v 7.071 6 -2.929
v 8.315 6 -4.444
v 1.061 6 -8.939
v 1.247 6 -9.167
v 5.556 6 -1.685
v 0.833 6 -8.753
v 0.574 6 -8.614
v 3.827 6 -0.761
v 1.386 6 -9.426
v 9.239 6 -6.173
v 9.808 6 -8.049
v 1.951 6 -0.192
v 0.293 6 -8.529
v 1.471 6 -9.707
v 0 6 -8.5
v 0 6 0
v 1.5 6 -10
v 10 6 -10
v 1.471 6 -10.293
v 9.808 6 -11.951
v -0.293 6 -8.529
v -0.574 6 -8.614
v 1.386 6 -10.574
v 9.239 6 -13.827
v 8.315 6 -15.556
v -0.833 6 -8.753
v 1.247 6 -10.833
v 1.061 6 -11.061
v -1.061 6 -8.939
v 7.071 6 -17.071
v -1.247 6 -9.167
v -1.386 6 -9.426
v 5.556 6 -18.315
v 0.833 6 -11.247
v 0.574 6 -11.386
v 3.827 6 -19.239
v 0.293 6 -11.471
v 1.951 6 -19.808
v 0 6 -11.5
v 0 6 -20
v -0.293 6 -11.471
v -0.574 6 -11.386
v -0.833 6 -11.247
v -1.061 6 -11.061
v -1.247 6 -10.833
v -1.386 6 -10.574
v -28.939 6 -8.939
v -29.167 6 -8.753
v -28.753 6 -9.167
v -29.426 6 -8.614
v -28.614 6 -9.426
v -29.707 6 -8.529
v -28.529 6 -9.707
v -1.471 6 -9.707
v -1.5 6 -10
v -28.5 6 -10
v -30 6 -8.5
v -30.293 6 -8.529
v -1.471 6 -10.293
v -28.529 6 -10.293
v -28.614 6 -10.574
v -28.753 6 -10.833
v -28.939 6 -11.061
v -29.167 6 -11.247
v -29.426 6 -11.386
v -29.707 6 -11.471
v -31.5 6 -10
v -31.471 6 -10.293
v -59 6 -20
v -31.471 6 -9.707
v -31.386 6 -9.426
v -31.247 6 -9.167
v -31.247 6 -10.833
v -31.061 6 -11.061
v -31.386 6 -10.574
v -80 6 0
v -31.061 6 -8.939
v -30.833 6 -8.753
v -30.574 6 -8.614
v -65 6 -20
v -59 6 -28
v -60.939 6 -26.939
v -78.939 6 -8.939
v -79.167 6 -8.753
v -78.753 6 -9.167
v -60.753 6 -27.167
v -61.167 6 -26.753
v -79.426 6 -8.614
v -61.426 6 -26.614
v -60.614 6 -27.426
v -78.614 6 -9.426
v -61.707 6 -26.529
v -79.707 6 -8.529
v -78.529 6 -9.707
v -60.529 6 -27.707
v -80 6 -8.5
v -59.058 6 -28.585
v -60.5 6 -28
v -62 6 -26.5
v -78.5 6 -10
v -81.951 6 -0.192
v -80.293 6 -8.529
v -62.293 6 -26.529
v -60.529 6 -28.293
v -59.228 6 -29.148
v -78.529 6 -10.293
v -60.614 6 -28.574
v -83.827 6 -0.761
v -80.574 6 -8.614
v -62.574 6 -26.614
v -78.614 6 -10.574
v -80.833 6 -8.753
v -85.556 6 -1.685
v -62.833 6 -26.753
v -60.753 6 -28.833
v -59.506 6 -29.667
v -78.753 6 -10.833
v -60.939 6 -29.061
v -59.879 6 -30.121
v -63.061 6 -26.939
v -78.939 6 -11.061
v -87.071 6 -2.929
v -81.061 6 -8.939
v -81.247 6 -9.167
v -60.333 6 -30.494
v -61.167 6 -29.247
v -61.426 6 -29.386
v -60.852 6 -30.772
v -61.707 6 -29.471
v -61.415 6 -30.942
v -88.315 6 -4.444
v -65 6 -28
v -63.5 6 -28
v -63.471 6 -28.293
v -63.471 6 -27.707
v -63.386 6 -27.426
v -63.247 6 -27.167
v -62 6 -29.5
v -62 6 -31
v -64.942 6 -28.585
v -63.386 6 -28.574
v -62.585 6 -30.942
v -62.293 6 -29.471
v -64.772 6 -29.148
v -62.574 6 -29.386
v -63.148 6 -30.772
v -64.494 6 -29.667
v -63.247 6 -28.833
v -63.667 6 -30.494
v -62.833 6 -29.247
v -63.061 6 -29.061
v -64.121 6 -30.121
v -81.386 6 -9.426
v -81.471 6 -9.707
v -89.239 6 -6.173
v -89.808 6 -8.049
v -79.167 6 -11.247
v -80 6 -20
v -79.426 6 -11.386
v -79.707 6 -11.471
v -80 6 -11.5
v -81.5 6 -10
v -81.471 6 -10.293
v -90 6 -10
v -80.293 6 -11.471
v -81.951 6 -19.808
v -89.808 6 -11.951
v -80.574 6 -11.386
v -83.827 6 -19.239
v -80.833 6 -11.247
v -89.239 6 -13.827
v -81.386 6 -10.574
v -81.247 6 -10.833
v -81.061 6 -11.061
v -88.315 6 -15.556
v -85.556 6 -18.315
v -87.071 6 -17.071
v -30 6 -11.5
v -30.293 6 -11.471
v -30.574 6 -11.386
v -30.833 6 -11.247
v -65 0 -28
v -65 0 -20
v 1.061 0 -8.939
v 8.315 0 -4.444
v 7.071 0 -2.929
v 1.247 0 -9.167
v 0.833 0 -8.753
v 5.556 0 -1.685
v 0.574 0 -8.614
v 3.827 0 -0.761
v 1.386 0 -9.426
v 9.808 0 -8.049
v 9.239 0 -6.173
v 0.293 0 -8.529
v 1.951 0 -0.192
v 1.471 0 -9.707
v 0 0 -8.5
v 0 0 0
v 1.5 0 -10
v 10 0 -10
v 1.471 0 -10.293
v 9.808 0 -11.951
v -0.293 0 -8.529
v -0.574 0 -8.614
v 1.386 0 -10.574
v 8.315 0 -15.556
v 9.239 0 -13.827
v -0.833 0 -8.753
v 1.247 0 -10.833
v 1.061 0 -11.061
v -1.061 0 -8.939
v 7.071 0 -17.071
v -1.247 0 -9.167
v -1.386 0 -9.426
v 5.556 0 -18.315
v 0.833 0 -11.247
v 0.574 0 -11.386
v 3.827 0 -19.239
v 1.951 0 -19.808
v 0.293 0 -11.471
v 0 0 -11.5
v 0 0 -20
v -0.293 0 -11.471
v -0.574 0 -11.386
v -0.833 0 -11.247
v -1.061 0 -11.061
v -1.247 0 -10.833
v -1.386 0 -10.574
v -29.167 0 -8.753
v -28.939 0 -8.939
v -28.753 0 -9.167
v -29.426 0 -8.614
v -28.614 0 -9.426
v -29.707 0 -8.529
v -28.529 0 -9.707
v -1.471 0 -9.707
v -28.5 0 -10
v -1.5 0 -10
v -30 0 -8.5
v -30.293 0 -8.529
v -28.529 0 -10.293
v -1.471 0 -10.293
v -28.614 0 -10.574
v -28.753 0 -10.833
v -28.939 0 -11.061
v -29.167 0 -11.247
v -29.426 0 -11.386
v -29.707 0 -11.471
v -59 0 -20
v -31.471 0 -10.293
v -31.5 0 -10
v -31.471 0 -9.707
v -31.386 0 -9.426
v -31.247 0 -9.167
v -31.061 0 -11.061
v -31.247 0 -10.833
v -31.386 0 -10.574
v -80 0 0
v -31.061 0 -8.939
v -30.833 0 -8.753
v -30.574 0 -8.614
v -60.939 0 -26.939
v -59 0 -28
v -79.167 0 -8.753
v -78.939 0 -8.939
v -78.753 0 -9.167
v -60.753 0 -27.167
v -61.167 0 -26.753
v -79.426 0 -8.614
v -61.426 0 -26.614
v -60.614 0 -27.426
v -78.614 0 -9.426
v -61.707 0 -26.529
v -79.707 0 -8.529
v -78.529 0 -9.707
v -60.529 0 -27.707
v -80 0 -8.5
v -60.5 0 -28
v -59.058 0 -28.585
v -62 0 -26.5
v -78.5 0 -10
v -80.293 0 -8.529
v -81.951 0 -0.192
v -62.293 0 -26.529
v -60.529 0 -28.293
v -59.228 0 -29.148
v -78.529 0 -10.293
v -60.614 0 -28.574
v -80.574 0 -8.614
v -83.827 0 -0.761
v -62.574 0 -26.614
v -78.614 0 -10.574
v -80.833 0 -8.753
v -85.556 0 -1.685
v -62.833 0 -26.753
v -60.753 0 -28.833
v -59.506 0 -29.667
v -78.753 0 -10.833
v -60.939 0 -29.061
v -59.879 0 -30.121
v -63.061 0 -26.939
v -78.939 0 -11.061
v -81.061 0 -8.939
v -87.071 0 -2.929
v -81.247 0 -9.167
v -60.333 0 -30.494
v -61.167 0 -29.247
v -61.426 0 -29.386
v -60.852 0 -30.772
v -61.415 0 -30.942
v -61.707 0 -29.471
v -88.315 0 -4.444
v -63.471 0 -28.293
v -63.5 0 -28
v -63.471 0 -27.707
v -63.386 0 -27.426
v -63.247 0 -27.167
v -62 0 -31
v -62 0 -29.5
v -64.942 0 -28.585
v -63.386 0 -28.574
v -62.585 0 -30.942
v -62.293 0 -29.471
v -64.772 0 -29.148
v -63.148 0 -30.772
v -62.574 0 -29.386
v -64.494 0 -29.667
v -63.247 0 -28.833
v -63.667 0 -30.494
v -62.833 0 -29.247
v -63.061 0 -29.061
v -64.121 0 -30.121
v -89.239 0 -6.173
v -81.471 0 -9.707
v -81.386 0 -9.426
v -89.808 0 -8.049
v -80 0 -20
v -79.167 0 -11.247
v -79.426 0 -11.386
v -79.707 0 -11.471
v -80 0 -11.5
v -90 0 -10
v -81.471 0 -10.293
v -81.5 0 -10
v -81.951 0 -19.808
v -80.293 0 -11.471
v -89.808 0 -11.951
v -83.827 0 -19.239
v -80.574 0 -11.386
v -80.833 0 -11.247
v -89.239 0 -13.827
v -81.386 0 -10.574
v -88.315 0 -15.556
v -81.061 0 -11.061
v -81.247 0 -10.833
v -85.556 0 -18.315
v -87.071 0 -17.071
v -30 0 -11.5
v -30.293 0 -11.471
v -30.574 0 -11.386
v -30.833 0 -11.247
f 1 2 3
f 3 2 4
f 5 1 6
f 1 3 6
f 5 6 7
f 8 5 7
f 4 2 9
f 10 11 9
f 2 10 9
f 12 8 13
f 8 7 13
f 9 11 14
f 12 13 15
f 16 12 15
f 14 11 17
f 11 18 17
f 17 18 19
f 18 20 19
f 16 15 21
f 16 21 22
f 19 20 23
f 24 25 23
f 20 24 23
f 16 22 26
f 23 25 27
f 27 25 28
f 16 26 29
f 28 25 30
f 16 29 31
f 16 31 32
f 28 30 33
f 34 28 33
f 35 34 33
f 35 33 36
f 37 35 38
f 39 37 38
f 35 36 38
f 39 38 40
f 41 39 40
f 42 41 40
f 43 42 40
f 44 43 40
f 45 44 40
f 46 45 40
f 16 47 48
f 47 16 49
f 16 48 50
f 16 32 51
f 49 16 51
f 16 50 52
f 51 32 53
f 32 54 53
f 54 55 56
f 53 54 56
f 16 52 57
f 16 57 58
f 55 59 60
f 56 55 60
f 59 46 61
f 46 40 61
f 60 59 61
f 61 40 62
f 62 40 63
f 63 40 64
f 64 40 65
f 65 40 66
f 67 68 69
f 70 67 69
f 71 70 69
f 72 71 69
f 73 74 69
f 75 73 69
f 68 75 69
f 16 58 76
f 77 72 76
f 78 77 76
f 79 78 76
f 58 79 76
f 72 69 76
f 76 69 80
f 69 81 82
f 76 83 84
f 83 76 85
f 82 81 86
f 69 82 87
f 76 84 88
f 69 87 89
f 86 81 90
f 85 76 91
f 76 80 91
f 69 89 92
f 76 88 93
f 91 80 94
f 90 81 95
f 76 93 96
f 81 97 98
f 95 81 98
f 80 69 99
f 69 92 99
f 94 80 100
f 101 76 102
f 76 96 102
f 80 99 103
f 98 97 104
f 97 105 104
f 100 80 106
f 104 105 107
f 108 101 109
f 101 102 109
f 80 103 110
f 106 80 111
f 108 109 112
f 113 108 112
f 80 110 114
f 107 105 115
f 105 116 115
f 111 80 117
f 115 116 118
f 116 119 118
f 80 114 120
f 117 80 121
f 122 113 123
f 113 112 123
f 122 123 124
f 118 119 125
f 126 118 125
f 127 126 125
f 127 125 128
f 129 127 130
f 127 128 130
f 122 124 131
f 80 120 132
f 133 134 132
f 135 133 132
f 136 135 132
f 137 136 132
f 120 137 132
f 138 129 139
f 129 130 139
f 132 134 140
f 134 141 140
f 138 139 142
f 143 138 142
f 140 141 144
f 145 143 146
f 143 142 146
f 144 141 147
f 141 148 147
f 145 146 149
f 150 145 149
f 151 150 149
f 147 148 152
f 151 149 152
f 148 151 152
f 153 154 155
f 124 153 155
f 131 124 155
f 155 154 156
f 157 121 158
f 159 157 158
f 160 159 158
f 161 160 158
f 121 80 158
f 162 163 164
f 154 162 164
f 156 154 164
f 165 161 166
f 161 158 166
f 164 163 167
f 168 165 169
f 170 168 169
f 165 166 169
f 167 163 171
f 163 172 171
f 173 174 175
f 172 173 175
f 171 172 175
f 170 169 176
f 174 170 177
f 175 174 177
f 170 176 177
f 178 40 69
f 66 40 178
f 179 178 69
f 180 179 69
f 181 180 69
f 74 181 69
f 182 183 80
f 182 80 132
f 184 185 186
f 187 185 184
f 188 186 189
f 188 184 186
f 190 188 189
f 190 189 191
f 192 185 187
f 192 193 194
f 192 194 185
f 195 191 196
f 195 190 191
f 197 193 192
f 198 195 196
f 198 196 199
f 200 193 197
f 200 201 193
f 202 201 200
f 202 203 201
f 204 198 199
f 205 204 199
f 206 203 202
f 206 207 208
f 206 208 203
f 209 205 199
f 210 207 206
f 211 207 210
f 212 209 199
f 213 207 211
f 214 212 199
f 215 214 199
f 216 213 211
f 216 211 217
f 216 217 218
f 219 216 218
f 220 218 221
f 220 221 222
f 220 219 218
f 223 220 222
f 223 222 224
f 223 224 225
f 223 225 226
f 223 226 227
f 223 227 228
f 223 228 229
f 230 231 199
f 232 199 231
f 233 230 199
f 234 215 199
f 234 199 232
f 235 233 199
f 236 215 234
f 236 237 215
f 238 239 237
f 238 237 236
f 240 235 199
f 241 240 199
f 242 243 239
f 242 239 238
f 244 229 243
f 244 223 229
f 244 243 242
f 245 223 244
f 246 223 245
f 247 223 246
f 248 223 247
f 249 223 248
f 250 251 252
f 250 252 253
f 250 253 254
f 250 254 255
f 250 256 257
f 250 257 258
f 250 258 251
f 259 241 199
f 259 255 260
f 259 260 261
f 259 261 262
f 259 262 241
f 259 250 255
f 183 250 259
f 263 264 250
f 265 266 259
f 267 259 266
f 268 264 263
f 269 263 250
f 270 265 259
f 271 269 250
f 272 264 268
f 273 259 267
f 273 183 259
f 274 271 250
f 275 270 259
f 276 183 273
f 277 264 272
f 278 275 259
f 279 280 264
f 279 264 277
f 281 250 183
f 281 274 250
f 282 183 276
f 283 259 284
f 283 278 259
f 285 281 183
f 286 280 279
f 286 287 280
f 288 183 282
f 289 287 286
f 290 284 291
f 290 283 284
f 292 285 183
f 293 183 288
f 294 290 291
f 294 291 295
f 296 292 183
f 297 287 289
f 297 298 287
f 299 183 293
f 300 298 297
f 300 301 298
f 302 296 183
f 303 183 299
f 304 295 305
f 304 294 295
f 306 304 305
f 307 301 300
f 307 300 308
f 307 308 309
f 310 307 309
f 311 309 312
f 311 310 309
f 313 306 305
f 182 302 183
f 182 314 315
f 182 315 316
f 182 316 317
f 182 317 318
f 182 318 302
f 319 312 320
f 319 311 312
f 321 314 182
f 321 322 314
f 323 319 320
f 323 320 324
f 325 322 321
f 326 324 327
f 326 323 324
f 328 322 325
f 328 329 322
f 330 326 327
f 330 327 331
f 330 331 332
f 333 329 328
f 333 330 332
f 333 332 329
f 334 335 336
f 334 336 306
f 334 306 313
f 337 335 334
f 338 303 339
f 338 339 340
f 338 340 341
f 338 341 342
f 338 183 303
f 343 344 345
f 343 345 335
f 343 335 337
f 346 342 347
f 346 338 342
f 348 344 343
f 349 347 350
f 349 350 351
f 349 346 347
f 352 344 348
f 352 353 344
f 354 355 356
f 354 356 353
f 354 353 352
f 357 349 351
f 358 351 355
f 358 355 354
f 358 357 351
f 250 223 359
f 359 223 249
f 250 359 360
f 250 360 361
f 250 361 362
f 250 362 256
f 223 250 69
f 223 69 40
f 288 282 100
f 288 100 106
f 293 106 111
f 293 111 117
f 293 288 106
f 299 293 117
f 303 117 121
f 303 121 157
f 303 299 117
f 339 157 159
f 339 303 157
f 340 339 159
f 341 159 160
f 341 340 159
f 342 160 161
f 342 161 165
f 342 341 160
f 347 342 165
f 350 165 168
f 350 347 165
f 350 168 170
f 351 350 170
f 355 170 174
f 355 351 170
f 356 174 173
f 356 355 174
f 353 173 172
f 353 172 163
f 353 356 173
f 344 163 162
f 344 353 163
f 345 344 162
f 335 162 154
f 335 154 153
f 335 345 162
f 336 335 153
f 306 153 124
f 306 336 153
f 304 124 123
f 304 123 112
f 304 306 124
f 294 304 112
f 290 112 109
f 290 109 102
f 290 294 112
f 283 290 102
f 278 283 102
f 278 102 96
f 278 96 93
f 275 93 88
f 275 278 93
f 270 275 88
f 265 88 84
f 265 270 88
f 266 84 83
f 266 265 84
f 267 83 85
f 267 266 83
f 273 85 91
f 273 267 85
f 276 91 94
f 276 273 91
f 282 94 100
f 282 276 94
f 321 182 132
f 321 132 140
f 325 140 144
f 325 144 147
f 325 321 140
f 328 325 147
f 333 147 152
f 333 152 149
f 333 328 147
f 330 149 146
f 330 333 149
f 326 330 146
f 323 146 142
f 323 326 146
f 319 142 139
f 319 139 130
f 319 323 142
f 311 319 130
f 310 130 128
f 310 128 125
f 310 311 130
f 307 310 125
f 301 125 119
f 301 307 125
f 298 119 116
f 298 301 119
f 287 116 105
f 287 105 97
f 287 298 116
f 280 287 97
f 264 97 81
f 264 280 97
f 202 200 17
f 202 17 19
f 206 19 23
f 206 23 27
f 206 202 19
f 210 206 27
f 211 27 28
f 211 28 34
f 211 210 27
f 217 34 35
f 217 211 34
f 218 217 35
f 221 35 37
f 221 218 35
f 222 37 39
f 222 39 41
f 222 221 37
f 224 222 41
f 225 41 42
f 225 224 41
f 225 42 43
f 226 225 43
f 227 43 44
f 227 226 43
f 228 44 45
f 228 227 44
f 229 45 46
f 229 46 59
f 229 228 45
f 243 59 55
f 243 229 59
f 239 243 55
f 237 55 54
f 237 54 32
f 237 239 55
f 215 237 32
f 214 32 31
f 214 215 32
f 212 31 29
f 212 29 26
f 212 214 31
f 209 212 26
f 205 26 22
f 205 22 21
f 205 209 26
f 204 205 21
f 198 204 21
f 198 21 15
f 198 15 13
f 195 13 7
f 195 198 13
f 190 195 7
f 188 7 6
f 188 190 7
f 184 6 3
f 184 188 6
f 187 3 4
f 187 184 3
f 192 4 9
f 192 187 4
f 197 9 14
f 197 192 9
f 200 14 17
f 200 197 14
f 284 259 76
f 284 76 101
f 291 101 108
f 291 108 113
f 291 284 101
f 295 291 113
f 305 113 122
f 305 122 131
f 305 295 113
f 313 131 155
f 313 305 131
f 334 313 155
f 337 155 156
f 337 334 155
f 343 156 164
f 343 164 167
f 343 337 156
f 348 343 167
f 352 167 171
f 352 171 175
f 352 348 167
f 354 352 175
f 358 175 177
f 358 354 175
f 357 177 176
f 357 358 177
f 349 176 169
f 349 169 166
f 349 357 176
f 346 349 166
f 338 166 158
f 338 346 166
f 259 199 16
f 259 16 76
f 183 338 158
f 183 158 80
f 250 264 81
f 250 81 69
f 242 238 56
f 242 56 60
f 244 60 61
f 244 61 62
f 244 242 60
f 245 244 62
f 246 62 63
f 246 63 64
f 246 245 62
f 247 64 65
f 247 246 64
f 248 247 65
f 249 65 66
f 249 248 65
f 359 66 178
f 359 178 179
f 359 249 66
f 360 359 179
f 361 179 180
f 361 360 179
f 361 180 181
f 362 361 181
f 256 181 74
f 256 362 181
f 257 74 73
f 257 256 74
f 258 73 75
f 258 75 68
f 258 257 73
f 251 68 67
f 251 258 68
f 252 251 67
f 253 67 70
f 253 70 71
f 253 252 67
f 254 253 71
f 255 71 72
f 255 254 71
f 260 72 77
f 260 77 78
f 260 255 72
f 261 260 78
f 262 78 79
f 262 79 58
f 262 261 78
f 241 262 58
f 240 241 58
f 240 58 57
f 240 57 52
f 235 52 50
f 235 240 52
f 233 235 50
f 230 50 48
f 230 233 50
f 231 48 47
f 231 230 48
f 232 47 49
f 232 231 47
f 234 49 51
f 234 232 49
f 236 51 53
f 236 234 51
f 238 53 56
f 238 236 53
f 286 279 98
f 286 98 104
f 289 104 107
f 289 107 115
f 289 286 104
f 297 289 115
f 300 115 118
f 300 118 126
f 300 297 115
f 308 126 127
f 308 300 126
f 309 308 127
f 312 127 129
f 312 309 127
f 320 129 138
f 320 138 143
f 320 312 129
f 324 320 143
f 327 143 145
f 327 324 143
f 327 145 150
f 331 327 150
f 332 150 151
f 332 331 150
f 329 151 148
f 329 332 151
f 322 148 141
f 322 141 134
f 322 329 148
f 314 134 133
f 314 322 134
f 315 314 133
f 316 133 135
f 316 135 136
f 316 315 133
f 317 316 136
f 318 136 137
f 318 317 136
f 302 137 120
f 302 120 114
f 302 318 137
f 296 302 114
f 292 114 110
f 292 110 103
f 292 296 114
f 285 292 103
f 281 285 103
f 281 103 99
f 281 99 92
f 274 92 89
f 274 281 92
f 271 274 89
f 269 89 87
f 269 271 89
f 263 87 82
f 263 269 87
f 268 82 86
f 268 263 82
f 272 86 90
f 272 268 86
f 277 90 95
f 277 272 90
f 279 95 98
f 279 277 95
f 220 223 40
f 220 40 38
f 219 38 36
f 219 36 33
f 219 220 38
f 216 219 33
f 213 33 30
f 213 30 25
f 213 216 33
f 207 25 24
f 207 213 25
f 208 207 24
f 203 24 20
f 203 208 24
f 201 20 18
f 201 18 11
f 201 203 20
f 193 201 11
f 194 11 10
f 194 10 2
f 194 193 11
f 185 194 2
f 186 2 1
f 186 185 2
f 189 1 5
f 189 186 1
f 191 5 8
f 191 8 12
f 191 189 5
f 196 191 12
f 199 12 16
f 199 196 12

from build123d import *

# Parameters (mm, degrees)
SKETCH1_R           = 1.5
BOSS_EXTRUDE1_DEPTH = 6


with BuildPart() as part:
    # Sketch1 → Boss-Extrude1 (new body)
    with BuildSketch(Plane(origin=(0, 0, 0), x_dir=(1, 0, 0), z_dir=(0, 1, 0))):
        with BuildLine():
            Line((0, 0), (-80, 0))
            ThreePointArc((-80, 0), (-90, 10), (-80, 20))
            Line((-80, 20), (-65, 20))
            Line((-65, 20), (-65, 28))
            ThreePointArc((-65, 28), (-62, 31), (-59, 28))
            Line((-59, 28), (-59, 20))
            Line((-59, 20), (0, 20))
            ThreePointArc((0, 20), (10, 10), (0, 0))
        make_face()
        with Locations((-80, 10)):
            Circle(SKETCH1_R, mode=Mode.SUBTRACT)
        with Locations((0, 10)):
            Circle(SKETCH1_R, mode=Mode.SUBTRACT)
        with Locations((-30, 10)):
            Circle(SKETCH1_R, mode=Mode.SUBTRACT)
        with Locations((-62, 28)):
            Circle(SKETCH1_R, mode=Mode.SUBTRACT)
    extrude(amount=BOSS_EXTRUDE1_DEPTH)


solid = part.part
